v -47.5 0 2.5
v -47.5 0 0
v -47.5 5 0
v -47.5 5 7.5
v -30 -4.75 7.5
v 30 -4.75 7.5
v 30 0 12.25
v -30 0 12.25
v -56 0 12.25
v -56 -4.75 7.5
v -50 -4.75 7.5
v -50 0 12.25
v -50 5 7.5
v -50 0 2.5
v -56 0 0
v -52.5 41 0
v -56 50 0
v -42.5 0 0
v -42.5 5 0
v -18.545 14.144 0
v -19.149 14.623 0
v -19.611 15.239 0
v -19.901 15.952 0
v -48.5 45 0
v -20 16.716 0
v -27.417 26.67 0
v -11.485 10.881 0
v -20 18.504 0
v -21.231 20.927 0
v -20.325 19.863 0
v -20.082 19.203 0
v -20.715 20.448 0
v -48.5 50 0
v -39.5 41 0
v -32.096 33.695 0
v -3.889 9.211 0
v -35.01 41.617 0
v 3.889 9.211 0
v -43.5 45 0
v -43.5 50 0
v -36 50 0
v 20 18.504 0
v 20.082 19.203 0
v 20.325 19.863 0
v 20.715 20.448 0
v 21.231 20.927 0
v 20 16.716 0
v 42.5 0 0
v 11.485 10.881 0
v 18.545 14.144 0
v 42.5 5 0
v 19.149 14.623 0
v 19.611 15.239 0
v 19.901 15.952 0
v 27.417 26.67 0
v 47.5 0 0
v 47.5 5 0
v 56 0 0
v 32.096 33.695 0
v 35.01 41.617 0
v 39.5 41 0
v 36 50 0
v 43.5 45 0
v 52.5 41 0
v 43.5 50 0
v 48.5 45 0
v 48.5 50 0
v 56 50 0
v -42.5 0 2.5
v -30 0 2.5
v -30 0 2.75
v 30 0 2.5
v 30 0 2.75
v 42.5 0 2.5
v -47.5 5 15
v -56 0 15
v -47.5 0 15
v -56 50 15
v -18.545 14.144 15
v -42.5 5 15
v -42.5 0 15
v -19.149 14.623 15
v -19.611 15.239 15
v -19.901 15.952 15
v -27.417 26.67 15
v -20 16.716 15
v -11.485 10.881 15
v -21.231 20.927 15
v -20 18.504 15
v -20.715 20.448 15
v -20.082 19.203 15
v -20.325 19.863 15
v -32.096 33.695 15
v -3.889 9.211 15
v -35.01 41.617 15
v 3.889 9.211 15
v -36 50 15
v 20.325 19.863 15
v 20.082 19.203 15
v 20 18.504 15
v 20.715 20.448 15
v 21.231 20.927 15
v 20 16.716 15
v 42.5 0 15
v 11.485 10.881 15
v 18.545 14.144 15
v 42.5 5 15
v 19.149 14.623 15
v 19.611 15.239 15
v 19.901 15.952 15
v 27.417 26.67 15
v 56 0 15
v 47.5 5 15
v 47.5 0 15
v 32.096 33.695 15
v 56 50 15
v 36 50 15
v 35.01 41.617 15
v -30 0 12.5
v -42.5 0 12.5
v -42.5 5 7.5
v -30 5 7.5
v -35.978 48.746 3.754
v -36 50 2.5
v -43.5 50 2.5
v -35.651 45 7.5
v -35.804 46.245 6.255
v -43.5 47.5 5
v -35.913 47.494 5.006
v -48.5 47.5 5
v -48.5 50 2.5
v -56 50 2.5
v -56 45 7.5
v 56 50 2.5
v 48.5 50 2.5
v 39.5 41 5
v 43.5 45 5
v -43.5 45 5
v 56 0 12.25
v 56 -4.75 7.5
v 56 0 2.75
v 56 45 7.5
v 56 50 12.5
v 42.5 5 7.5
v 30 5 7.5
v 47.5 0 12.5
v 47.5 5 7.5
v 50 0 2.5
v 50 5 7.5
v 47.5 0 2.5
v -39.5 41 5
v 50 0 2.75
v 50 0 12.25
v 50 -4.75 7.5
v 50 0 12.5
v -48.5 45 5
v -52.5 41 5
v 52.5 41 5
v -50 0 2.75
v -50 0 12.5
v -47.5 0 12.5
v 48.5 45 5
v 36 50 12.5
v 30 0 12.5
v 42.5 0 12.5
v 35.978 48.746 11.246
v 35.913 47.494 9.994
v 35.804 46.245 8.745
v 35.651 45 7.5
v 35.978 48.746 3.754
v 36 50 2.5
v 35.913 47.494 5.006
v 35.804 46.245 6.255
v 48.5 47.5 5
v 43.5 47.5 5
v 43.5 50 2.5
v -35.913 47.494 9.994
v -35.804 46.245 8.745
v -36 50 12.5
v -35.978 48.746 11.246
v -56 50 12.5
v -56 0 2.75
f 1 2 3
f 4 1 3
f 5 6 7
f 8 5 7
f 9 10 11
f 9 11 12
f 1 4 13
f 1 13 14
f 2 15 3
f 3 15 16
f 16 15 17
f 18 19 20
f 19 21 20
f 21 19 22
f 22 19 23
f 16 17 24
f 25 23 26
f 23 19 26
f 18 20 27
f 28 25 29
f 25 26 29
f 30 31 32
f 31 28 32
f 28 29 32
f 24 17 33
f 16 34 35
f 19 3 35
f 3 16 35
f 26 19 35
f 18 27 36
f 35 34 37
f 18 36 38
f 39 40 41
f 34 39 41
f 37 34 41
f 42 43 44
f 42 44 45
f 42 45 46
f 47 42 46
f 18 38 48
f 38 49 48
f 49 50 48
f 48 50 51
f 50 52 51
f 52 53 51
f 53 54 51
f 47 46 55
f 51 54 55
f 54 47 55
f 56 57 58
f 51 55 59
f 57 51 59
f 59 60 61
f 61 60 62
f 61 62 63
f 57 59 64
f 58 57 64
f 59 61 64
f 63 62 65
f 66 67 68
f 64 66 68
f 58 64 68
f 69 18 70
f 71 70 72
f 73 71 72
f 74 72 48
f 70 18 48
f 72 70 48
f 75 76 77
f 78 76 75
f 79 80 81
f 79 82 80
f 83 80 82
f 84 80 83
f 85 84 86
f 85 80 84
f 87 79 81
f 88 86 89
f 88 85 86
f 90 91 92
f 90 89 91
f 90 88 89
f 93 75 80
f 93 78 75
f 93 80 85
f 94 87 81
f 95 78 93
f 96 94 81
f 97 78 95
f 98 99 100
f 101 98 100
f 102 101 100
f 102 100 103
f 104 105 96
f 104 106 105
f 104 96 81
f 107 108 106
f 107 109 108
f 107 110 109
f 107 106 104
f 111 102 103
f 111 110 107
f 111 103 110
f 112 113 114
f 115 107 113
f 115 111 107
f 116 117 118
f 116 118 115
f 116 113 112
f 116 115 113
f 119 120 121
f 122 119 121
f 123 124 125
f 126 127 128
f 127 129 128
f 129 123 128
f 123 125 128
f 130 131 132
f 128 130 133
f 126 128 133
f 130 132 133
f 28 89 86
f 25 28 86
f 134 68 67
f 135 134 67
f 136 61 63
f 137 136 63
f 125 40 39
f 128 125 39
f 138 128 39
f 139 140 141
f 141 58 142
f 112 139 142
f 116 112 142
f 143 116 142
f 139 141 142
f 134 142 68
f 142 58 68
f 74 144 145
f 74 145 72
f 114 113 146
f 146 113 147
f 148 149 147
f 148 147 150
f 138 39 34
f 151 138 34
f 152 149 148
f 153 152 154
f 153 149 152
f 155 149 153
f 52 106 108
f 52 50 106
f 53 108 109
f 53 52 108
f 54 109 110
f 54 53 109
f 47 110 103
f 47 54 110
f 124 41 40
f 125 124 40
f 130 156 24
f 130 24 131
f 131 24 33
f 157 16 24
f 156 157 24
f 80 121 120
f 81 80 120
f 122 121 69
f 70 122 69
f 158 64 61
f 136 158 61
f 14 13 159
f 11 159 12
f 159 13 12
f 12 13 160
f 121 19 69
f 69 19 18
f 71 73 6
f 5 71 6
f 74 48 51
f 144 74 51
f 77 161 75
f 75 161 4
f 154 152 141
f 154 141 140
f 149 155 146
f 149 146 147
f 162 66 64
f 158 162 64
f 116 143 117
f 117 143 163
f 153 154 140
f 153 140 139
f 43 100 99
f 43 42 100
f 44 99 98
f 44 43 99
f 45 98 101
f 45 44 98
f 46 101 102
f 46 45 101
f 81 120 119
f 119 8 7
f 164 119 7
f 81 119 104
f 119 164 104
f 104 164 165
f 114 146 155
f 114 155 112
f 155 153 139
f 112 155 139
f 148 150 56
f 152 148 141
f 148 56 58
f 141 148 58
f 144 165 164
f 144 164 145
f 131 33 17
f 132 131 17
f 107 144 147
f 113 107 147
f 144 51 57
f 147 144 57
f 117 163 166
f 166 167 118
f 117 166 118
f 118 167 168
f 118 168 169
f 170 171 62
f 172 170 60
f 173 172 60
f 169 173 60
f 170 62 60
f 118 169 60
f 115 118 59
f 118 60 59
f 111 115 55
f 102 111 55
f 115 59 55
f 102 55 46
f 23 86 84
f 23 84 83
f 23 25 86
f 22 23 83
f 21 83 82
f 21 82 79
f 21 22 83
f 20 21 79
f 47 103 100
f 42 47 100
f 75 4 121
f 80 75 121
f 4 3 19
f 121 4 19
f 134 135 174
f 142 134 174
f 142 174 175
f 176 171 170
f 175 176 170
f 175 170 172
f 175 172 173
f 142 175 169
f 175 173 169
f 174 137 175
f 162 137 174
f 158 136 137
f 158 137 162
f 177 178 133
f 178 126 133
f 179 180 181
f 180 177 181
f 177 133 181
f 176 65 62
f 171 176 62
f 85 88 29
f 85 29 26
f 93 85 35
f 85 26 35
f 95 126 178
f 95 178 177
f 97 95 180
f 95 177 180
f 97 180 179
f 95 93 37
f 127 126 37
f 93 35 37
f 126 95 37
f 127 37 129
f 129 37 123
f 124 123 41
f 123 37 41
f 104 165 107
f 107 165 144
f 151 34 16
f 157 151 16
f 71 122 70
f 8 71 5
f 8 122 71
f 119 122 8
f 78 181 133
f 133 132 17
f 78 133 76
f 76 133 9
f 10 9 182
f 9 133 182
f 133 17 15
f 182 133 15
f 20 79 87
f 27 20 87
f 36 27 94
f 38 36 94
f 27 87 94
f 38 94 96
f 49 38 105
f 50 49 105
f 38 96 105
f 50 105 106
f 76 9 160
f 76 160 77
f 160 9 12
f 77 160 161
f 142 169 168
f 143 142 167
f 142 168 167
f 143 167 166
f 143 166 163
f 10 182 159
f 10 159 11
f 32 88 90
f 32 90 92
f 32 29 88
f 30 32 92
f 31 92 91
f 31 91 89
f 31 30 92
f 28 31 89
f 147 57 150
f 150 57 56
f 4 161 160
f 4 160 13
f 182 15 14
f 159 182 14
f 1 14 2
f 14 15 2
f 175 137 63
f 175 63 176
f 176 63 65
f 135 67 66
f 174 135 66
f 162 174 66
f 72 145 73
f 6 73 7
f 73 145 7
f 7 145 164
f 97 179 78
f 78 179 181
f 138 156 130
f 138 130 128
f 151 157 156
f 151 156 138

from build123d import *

# Parameters (mm, degrees)
F1_DEPTH       = 15
F3_DEPTH       = 112.001
F5_DEPTH       = 5
F7_DEPTH       = 112
F9_DEPTH       = 25
F12_DEPTH      = 15
F12_DEPTH_BACK = 5
F14_DEPTH      = 25
F15_R          = 3


# Not quite as in the source:
# - a pattern or mirror of a feature is missing from the dataset's text; its kind, count and spacing are read off the source's solid


with BuildPart() as f1:
    # F0 (on Top) → F1 (new body)
    with BuildSketch(Plane.XY):
        with BuildLine():
            Line((-56, 50), (-56, 0))
            Line((-56, 0), (56, 0))
            Line((56, 0), (56, 50))
            Line((56, 50), (36, 50))
            ThreePointArc((36, 50), (0, 14), (-36, 50))
            Line((-36, 50), (-56, 50))
        make_face()
    extrude(amount=F1_DEPTH)

    # F2 (on face) → F3 (cut, through all)
    with BuildSketch(Plane(origin=(-56, 0, 0), x_dir=(0, -1, 0), z_dir=(-1, 0, 0))):
        Polygon((-50, 12.5), (-50, 2.5), (-45, 7.5), align=None)
    extrude(amount=-F3_DEPTH, mode=Mode.SUBTRACT)

    # F4 (on face) → F5 (cut)
    with BuildSketch(Plane(origin=(0, 0, 0), x_dir=(1, 0, 0), z_dir=(0, 0, -1))):
        Polygon((-48.5, -45), (-48.5, -50), (-43.5, -50), (-43.5, -45), (-39.5, -41), (-52.5, -41), align=None)
        Polygon((43.5, -45), (43.5, -50), (48.5, -50), (48.5, -45), (52.5, -41), (39.5, -41), align=None)
    extrude(amount=-F5_DEPTH, mode=Mode.SUBTRACT)

    # F6 (on face) → F7 (join, through all)
    with BuildSketch(Plane(origin=(-56, 0, 0), x_dir=(0, -1, 0), z_dir=(-1, 0, 0))):
        Polygon((4.75, 7.5), (0, 12.25), (0, 2.75), align=None)
    extrude(amount=-F7_DEPTH)

    # F8 (on face) → F9 (cut)
    with BuildSketch(Plane(origin=(0, 0, 0), x_dir=(1, 0, 0), z_dir=(0, 0, -1))):
        Polygon((-47.5, 11.2829459831), (-47.5, 0), (-47.5, -5), (-42.5, -5), (-42.5, 0), (-42.5, 11.2829459831), align=None)
        Polygon((47.5, 11.2829459831), (42.5, 11.2829459831), (42.5, 0), (42.5, -5), (47.5, -5), (47.5, 0), align=None)
    extrude(amount=-F9_DEPTH, mode=Mode.SUBTRACT)

    # F11 (on mid) → F12 (cut, two sides)
    with BuildSketch(Plane(origin=(-45, 0, 0), x_dir=(0, -1, 0), z_dir=(-1, 0, 0))) as f12_sk:
        Polygon((0, 12.5), (-5, 7.5), (0, 2.5), (5, 7.5), align=None)
    f12 = extrude(amount=-F12_DEPTH, mode=Mode.SUBTRACT) + extrude(f12_sk.sketch, amount=F12_DEPTH_BACK, mode=Mode.SUBTRACT)

    # F12_copies: F12 across plane
    add(f12.mirror(Plane(origin=(0, 0, 0), x_dir=(0, 0, 1), z_dir=(1, 0, 0))), mode=Mode.SUBTRACT)

    # F13 (on face) → F14 (cut)
    with BuildSketch(Plane.XY.offset(15)):
        with BuildLine():
            Line((20, 15.0667409058), (20, 20.0667409058))
            ThreePointArc((20, 20.0667409058), (0, 14), (-20, 20.0667409058))
            Line((-20, 20.0667409058), (-20, 15.0667409058))
            ThreePointArc((-20, 15.0667409058), (0, 9), (20, 15.0667409058))
        make_face()
    extrude(amount=-F14_DEPTH, mode=Mode.SUBTRACT)

    # F15
    f15_edges = [f1.edges().sort_by_distance(p)[0] for p in [
        (-20, 20.066741, 7.5),
        (20, 20.066741, 7.5),
        (-20, 15.066741, 7.5),
        (20, 15.066741, 7.5),
    ]]
    fillet(f15_edges, radius=F15_R)


solid = f1.part
